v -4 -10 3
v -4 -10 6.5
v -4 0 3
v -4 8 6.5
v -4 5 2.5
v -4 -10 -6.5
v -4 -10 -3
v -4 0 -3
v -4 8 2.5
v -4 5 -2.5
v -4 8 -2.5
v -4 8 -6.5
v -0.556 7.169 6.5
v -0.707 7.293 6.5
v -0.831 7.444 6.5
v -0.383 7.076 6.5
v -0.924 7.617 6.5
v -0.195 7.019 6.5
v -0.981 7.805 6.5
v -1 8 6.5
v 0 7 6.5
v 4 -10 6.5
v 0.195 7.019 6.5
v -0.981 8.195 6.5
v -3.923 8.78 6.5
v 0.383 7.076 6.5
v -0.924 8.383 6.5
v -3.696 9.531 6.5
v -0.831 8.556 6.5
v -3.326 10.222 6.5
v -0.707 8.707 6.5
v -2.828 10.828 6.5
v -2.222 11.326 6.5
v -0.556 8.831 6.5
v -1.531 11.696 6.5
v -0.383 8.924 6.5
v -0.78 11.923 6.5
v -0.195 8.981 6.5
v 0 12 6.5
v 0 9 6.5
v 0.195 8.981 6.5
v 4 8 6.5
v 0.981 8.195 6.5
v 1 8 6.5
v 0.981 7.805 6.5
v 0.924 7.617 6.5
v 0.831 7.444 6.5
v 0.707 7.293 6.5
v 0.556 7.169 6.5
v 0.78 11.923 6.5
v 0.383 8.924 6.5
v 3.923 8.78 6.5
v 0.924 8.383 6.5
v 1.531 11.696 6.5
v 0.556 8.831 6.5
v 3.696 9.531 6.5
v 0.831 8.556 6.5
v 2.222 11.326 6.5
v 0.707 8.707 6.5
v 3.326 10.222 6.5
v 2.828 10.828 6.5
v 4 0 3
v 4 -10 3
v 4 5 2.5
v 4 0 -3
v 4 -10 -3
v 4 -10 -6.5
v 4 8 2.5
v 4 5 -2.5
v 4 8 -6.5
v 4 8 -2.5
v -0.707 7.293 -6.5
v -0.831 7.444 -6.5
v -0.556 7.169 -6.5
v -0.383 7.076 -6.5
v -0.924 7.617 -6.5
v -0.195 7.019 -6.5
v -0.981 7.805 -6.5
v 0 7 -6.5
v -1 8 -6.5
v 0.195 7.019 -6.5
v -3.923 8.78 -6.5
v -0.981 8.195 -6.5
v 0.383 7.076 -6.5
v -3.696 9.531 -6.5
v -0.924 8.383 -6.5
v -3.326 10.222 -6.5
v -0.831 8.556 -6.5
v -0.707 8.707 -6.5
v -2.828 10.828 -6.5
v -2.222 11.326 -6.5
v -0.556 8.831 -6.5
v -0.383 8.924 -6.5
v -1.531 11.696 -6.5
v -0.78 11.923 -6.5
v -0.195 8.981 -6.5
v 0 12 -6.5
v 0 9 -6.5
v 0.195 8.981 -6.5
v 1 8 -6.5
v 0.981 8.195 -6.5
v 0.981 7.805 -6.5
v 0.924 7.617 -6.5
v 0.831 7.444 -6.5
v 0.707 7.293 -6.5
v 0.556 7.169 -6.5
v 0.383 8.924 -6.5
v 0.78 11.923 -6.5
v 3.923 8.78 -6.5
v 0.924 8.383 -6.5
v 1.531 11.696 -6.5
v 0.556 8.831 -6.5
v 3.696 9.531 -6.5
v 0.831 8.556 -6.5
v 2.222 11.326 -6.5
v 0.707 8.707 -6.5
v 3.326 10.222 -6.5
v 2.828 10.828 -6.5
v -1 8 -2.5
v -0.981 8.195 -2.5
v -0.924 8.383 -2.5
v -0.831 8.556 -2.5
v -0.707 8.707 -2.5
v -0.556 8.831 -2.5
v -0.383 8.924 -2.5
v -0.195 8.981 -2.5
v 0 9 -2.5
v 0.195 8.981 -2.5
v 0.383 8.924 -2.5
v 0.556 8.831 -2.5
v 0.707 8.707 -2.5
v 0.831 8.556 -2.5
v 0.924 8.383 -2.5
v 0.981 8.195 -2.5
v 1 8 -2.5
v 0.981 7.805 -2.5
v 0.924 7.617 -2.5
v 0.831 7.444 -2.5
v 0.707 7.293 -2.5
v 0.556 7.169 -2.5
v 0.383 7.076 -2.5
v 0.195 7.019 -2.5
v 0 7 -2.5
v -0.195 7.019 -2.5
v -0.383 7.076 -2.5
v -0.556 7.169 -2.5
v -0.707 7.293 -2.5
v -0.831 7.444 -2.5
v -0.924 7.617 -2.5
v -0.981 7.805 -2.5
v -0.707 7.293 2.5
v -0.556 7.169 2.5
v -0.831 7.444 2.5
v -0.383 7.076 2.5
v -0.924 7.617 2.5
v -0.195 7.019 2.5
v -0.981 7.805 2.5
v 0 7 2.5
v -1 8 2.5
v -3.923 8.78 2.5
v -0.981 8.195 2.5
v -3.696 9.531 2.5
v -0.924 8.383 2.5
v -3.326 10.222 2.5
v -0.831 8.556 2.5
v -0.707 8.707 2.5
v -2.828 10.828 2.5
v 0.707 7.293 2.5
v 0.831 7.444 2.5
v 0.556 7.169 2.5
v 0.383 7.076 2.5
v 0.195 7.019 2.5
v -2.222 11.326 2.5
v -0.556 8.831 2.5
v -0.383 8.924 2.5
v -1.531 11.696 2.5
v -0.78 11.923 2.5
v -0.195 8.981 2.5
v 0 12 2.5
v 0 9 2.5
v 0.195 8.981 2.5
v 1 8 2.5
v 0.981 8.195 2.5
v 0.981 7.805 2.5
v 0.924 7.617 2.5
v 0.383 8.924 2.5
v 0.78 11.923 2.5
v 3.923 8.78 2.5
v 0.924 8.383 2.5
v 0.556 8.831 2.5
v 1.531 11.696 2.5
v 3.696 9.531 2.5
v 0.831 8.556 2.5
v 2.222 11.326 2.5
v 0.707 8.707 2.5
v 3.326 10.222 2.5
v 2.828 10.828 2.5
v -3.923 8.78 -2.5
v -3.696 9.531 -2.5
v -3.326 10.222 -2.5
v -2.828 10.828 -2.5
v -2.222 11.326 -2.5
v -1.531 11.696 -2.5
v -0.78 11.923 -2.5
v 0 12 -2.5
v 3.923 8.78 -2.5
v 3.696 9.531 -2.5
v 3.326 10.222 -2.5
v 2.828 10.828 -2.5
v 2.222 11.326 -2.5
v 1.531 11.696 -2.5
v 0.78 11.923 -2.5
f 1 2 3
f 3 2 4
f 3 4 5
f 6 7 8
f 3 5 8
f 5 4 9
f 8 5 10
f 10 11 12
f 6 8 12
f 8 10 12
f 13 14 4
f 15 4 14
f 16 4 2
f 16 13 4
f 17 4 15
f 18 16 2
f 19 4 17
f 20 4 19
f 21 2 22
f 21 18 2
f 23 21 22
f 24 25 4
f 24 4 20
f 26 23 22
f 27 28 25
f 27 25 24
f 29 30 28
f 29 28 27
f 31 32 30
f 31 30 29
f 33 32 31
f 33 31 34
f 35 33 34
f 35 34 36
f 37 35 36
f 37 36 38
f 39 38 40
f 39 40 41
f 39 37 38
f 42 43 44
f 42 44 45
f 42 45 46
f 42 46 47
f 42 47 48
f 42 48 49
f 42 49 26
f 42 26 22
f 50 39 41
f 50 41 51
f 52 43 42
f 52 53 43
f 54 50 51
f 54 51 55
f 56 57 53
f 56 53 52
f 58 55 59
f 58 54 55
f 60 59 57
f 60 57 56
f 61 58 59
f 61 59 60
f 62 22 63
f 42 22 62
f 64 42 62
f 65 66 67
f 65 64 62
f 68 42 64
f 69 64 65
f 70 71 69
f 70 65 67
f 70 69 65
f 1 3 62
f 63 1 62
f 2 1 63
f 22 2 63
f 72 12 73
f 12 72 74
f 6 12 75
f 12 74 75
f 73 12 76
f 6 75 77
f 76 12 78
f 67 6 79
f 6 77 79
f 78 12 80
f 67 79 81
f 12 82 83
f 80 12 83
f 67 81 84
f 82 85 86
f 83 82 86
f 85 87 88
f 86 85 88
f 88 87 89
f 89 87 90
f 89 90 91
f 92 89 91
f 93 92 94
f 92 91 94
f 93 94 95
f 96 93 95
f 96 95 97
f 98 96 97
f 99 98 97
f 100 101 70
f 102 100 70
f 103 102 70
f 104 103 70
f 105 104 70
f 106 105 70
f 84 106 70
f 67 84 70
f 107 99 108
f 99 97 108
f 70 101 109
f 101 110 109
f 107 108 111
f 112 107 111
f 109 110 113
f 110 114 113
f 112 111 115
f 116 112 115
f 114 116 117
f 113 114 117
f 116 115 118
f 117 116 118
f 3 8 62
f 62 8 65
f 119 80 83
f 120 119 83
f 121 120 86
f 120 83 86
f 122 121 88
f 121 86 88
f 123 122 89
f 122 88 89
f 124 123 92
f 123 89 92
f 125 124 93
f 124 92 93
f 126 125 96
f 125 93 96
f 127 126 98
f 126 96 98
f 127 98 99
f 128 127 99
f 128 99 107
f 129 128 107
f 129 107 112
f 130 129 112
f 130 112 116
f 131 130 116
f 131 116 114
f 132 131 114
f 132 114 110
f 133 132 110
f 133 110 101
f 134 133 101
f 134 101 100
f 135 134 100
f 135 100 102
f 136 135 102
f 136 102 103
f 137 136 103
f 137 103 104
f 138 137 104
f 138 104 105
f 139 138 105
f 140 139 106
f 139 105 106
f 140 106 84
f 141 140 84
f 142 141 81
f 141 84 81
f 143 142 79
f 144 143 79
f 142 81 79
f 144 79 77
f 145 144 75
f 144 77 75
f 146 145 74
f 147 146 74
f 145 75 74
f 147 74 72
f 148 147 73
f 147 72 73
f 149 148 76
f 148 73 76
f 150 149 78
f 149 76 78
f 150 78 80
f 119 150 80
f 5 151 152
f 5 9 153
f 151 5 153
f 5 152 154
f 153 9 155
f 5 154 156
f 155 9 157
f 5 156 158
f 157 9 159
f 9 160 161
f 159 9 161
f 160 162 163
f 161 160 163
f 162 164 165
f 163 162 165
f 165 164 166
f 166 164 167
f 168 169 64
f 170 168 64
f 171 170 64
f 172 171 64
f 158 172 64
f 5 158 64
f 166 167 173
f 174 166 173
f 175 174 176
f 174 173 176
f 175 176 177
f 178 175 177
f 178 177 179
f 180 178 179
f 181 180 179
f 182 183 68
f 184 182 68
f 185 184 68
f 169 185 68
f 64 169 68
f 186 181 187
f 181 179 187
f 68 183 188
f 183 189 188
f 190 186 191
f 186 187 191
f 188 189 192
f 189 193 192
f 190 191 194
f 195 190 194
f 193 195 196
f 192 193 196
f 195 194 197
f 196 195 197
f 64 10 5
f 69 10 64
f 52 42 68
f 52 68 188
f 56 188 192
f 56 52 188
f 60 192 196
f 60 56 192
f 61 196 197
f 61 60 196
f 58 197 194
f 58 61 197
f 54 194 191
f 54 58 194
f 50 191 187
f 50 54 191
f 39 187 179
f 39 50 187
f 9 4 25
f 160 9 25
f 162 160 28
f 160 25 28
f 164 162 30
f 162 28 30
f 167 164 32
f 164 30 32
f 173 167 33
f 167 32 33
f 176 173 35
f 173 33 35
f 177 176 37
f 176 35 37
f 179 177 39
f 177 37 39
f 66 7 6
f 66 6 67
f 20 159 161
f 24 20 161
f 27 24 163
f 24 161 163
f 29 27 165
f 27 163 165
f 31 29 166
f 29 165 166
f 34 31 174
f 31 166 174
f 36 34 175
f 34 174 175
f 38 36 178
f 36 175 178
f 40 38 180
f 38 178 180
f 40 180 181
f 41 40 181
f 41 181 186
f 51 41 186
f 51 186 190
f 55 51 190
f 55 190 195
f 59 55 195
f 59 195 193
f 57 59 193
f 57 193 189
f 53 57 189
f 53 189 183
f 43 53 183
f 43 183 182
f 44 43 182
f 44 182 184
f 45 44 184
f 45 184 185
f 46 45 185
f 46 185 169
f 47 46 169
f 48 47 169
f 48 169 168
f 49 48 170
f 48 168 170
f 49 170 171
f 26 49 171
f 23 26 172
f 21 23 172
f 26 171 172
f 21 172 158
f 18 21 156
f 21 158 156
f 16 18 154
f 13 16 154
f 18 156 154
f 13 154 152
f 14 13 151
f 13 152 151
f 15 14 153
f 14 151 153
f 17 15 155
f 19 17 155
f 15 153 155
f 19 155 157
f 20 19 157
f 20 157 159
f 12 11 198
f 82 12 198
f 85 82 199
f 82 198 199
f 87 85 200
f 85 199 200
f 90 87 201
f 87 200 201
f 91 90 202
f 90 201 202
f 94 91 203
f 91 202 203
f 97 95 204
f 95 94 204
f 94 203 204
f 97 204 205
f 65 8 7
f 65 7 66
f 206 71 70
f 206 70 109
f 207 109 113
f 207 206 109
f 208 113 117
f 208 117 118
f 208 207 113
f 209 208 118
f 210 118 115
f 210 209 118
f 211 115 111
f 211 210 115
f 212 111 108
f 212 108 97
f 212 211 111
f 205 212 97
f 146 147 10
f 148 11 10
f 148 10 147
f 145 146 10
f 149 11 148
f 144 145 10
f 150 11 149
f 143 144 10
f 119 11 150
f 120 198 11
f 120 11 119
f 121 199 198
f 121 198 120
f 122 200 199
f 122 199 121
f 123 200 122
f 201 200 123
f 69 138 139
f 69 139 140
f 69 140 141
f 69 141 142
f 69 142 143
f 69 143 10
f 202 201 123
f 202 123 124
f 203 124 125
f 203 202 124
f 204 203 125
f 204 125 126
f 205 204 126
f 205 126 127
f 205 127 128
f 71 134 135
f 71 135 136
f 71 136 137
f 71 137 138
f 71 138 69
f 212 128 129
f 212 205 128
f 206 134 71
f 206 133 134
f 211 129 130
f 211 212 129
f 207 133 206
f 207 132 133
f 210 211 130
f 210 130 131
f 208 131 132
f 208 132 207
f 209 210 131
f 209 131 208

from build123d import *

# Parameters (mm, degrees)
SKETCH1_W           = 8
SKETCH1_H           = 13
BOSS_EXTRUDE1_DEPTH = 12
SKETCH2_W           = 13
SKETCH2_H           = 5
CUT_EXTRUDE1_DEPTH  = 7
SKETCH3_R           = 1
CUT_EXTRUDE2_DEPTH  = 19.138357147
CUT_EXTRUDE3_START  = -13
CUT_EXTRUDE3_DEPTH  = 32.138357147
SKETCH7_W           = 8
SKETCH7_H           = 3.5
BOSS_EXTRUDE4_DEPTH = 10


with BuildPart() as part:
    # Sketch1 → Boss-Extrude1 (new body)
    with BuildSketch(Plane(origin=(0, 0, 0), x_dir=(1, 0, 0), z_dir=(0, 1, 0))):
        Rectangle(SKETCH1_W, SKETCH1_H)
    extrude(amount=BOSS_EXTRUDE1_DEPTH)

    # Sketch2 → Cut-Extrude1 (cut)
    with BuildSketch(Plane(origin=(0, 12, 0), x_dir=(1, 0, 0), z_dir=(0, 1, 0))):
        Rectangle(SKETCH2_W, SKETCH2_H)
    extrude(amount=-CUT_EXTRUDE1_DEPTH, mode=Mode.SUBTRACT)

    # Sketch3 → Cut-Extrude2 (cut, through all)
    with BuildSketch(Plane(origin=(0, 0, -6.5), x_dir=(-1, 0, 0), z_dir=(0, 0, -1))):
        with Locations((0, 8)):
            Circle(SKETCH3_R)
    extrude(amount=-CUT_EXTRUDE2_DEPTH, mode=Mode.SUBTRACT)

    # Sketch4 → Cut-Extrude3 (cut)
    with BuildSketch(Plane(origin=(0, 0, -6.5), x_dir=(-1, 0, 0), z_dir=(0, 0, -1)).offset(CUT_EXTRUDE3_START)):
        with BuildLine():
            Line((-4, -27.298221281), (-4, 8))
            ThreePointArc((-4, 8), (-2.828427125, 10.828427125), (0, 12))
            Line((0, 12), (35.298221281, 12))
            Line((35.298221281, 12), (-14.621001982, 61.919223264))
            Line((-14.621001982, 61.919223264), (-53.919223264, 22.621001982))
            Line((-53.919223264, 22.621001982), (-4, -27.298221281))
        make_face()
    cut_extrude3 = extrude(amount=CUT_EXTRUDE3_DEPTH, mode=Mode.SUBTRACT)

    # Mirror1: Cut-Extrude3 across plane
    add(cut_extrude3.mirror(Plane(origin=(0, 0, 0), x_dir=(0, 0, 1), z_dir=(1, 0, 0))), mode=Mode.SUBTRACT)

    # Sketch7 → Boss-Extrude4 (add)
    with BuildSketch(Plane.XZ):
        with Locations((0, -4.75)):
            Rectangle(SKETCH7_W, SKETCH7_H)
    boss_extrude4 = extrude(amount=BOSS_EXTRUDE4_DEPTH)

    # Mirror2: Boss-Extrude4 across plane
    add(boss_extrude4.mirror(Plane.XY))


solid = part.part
